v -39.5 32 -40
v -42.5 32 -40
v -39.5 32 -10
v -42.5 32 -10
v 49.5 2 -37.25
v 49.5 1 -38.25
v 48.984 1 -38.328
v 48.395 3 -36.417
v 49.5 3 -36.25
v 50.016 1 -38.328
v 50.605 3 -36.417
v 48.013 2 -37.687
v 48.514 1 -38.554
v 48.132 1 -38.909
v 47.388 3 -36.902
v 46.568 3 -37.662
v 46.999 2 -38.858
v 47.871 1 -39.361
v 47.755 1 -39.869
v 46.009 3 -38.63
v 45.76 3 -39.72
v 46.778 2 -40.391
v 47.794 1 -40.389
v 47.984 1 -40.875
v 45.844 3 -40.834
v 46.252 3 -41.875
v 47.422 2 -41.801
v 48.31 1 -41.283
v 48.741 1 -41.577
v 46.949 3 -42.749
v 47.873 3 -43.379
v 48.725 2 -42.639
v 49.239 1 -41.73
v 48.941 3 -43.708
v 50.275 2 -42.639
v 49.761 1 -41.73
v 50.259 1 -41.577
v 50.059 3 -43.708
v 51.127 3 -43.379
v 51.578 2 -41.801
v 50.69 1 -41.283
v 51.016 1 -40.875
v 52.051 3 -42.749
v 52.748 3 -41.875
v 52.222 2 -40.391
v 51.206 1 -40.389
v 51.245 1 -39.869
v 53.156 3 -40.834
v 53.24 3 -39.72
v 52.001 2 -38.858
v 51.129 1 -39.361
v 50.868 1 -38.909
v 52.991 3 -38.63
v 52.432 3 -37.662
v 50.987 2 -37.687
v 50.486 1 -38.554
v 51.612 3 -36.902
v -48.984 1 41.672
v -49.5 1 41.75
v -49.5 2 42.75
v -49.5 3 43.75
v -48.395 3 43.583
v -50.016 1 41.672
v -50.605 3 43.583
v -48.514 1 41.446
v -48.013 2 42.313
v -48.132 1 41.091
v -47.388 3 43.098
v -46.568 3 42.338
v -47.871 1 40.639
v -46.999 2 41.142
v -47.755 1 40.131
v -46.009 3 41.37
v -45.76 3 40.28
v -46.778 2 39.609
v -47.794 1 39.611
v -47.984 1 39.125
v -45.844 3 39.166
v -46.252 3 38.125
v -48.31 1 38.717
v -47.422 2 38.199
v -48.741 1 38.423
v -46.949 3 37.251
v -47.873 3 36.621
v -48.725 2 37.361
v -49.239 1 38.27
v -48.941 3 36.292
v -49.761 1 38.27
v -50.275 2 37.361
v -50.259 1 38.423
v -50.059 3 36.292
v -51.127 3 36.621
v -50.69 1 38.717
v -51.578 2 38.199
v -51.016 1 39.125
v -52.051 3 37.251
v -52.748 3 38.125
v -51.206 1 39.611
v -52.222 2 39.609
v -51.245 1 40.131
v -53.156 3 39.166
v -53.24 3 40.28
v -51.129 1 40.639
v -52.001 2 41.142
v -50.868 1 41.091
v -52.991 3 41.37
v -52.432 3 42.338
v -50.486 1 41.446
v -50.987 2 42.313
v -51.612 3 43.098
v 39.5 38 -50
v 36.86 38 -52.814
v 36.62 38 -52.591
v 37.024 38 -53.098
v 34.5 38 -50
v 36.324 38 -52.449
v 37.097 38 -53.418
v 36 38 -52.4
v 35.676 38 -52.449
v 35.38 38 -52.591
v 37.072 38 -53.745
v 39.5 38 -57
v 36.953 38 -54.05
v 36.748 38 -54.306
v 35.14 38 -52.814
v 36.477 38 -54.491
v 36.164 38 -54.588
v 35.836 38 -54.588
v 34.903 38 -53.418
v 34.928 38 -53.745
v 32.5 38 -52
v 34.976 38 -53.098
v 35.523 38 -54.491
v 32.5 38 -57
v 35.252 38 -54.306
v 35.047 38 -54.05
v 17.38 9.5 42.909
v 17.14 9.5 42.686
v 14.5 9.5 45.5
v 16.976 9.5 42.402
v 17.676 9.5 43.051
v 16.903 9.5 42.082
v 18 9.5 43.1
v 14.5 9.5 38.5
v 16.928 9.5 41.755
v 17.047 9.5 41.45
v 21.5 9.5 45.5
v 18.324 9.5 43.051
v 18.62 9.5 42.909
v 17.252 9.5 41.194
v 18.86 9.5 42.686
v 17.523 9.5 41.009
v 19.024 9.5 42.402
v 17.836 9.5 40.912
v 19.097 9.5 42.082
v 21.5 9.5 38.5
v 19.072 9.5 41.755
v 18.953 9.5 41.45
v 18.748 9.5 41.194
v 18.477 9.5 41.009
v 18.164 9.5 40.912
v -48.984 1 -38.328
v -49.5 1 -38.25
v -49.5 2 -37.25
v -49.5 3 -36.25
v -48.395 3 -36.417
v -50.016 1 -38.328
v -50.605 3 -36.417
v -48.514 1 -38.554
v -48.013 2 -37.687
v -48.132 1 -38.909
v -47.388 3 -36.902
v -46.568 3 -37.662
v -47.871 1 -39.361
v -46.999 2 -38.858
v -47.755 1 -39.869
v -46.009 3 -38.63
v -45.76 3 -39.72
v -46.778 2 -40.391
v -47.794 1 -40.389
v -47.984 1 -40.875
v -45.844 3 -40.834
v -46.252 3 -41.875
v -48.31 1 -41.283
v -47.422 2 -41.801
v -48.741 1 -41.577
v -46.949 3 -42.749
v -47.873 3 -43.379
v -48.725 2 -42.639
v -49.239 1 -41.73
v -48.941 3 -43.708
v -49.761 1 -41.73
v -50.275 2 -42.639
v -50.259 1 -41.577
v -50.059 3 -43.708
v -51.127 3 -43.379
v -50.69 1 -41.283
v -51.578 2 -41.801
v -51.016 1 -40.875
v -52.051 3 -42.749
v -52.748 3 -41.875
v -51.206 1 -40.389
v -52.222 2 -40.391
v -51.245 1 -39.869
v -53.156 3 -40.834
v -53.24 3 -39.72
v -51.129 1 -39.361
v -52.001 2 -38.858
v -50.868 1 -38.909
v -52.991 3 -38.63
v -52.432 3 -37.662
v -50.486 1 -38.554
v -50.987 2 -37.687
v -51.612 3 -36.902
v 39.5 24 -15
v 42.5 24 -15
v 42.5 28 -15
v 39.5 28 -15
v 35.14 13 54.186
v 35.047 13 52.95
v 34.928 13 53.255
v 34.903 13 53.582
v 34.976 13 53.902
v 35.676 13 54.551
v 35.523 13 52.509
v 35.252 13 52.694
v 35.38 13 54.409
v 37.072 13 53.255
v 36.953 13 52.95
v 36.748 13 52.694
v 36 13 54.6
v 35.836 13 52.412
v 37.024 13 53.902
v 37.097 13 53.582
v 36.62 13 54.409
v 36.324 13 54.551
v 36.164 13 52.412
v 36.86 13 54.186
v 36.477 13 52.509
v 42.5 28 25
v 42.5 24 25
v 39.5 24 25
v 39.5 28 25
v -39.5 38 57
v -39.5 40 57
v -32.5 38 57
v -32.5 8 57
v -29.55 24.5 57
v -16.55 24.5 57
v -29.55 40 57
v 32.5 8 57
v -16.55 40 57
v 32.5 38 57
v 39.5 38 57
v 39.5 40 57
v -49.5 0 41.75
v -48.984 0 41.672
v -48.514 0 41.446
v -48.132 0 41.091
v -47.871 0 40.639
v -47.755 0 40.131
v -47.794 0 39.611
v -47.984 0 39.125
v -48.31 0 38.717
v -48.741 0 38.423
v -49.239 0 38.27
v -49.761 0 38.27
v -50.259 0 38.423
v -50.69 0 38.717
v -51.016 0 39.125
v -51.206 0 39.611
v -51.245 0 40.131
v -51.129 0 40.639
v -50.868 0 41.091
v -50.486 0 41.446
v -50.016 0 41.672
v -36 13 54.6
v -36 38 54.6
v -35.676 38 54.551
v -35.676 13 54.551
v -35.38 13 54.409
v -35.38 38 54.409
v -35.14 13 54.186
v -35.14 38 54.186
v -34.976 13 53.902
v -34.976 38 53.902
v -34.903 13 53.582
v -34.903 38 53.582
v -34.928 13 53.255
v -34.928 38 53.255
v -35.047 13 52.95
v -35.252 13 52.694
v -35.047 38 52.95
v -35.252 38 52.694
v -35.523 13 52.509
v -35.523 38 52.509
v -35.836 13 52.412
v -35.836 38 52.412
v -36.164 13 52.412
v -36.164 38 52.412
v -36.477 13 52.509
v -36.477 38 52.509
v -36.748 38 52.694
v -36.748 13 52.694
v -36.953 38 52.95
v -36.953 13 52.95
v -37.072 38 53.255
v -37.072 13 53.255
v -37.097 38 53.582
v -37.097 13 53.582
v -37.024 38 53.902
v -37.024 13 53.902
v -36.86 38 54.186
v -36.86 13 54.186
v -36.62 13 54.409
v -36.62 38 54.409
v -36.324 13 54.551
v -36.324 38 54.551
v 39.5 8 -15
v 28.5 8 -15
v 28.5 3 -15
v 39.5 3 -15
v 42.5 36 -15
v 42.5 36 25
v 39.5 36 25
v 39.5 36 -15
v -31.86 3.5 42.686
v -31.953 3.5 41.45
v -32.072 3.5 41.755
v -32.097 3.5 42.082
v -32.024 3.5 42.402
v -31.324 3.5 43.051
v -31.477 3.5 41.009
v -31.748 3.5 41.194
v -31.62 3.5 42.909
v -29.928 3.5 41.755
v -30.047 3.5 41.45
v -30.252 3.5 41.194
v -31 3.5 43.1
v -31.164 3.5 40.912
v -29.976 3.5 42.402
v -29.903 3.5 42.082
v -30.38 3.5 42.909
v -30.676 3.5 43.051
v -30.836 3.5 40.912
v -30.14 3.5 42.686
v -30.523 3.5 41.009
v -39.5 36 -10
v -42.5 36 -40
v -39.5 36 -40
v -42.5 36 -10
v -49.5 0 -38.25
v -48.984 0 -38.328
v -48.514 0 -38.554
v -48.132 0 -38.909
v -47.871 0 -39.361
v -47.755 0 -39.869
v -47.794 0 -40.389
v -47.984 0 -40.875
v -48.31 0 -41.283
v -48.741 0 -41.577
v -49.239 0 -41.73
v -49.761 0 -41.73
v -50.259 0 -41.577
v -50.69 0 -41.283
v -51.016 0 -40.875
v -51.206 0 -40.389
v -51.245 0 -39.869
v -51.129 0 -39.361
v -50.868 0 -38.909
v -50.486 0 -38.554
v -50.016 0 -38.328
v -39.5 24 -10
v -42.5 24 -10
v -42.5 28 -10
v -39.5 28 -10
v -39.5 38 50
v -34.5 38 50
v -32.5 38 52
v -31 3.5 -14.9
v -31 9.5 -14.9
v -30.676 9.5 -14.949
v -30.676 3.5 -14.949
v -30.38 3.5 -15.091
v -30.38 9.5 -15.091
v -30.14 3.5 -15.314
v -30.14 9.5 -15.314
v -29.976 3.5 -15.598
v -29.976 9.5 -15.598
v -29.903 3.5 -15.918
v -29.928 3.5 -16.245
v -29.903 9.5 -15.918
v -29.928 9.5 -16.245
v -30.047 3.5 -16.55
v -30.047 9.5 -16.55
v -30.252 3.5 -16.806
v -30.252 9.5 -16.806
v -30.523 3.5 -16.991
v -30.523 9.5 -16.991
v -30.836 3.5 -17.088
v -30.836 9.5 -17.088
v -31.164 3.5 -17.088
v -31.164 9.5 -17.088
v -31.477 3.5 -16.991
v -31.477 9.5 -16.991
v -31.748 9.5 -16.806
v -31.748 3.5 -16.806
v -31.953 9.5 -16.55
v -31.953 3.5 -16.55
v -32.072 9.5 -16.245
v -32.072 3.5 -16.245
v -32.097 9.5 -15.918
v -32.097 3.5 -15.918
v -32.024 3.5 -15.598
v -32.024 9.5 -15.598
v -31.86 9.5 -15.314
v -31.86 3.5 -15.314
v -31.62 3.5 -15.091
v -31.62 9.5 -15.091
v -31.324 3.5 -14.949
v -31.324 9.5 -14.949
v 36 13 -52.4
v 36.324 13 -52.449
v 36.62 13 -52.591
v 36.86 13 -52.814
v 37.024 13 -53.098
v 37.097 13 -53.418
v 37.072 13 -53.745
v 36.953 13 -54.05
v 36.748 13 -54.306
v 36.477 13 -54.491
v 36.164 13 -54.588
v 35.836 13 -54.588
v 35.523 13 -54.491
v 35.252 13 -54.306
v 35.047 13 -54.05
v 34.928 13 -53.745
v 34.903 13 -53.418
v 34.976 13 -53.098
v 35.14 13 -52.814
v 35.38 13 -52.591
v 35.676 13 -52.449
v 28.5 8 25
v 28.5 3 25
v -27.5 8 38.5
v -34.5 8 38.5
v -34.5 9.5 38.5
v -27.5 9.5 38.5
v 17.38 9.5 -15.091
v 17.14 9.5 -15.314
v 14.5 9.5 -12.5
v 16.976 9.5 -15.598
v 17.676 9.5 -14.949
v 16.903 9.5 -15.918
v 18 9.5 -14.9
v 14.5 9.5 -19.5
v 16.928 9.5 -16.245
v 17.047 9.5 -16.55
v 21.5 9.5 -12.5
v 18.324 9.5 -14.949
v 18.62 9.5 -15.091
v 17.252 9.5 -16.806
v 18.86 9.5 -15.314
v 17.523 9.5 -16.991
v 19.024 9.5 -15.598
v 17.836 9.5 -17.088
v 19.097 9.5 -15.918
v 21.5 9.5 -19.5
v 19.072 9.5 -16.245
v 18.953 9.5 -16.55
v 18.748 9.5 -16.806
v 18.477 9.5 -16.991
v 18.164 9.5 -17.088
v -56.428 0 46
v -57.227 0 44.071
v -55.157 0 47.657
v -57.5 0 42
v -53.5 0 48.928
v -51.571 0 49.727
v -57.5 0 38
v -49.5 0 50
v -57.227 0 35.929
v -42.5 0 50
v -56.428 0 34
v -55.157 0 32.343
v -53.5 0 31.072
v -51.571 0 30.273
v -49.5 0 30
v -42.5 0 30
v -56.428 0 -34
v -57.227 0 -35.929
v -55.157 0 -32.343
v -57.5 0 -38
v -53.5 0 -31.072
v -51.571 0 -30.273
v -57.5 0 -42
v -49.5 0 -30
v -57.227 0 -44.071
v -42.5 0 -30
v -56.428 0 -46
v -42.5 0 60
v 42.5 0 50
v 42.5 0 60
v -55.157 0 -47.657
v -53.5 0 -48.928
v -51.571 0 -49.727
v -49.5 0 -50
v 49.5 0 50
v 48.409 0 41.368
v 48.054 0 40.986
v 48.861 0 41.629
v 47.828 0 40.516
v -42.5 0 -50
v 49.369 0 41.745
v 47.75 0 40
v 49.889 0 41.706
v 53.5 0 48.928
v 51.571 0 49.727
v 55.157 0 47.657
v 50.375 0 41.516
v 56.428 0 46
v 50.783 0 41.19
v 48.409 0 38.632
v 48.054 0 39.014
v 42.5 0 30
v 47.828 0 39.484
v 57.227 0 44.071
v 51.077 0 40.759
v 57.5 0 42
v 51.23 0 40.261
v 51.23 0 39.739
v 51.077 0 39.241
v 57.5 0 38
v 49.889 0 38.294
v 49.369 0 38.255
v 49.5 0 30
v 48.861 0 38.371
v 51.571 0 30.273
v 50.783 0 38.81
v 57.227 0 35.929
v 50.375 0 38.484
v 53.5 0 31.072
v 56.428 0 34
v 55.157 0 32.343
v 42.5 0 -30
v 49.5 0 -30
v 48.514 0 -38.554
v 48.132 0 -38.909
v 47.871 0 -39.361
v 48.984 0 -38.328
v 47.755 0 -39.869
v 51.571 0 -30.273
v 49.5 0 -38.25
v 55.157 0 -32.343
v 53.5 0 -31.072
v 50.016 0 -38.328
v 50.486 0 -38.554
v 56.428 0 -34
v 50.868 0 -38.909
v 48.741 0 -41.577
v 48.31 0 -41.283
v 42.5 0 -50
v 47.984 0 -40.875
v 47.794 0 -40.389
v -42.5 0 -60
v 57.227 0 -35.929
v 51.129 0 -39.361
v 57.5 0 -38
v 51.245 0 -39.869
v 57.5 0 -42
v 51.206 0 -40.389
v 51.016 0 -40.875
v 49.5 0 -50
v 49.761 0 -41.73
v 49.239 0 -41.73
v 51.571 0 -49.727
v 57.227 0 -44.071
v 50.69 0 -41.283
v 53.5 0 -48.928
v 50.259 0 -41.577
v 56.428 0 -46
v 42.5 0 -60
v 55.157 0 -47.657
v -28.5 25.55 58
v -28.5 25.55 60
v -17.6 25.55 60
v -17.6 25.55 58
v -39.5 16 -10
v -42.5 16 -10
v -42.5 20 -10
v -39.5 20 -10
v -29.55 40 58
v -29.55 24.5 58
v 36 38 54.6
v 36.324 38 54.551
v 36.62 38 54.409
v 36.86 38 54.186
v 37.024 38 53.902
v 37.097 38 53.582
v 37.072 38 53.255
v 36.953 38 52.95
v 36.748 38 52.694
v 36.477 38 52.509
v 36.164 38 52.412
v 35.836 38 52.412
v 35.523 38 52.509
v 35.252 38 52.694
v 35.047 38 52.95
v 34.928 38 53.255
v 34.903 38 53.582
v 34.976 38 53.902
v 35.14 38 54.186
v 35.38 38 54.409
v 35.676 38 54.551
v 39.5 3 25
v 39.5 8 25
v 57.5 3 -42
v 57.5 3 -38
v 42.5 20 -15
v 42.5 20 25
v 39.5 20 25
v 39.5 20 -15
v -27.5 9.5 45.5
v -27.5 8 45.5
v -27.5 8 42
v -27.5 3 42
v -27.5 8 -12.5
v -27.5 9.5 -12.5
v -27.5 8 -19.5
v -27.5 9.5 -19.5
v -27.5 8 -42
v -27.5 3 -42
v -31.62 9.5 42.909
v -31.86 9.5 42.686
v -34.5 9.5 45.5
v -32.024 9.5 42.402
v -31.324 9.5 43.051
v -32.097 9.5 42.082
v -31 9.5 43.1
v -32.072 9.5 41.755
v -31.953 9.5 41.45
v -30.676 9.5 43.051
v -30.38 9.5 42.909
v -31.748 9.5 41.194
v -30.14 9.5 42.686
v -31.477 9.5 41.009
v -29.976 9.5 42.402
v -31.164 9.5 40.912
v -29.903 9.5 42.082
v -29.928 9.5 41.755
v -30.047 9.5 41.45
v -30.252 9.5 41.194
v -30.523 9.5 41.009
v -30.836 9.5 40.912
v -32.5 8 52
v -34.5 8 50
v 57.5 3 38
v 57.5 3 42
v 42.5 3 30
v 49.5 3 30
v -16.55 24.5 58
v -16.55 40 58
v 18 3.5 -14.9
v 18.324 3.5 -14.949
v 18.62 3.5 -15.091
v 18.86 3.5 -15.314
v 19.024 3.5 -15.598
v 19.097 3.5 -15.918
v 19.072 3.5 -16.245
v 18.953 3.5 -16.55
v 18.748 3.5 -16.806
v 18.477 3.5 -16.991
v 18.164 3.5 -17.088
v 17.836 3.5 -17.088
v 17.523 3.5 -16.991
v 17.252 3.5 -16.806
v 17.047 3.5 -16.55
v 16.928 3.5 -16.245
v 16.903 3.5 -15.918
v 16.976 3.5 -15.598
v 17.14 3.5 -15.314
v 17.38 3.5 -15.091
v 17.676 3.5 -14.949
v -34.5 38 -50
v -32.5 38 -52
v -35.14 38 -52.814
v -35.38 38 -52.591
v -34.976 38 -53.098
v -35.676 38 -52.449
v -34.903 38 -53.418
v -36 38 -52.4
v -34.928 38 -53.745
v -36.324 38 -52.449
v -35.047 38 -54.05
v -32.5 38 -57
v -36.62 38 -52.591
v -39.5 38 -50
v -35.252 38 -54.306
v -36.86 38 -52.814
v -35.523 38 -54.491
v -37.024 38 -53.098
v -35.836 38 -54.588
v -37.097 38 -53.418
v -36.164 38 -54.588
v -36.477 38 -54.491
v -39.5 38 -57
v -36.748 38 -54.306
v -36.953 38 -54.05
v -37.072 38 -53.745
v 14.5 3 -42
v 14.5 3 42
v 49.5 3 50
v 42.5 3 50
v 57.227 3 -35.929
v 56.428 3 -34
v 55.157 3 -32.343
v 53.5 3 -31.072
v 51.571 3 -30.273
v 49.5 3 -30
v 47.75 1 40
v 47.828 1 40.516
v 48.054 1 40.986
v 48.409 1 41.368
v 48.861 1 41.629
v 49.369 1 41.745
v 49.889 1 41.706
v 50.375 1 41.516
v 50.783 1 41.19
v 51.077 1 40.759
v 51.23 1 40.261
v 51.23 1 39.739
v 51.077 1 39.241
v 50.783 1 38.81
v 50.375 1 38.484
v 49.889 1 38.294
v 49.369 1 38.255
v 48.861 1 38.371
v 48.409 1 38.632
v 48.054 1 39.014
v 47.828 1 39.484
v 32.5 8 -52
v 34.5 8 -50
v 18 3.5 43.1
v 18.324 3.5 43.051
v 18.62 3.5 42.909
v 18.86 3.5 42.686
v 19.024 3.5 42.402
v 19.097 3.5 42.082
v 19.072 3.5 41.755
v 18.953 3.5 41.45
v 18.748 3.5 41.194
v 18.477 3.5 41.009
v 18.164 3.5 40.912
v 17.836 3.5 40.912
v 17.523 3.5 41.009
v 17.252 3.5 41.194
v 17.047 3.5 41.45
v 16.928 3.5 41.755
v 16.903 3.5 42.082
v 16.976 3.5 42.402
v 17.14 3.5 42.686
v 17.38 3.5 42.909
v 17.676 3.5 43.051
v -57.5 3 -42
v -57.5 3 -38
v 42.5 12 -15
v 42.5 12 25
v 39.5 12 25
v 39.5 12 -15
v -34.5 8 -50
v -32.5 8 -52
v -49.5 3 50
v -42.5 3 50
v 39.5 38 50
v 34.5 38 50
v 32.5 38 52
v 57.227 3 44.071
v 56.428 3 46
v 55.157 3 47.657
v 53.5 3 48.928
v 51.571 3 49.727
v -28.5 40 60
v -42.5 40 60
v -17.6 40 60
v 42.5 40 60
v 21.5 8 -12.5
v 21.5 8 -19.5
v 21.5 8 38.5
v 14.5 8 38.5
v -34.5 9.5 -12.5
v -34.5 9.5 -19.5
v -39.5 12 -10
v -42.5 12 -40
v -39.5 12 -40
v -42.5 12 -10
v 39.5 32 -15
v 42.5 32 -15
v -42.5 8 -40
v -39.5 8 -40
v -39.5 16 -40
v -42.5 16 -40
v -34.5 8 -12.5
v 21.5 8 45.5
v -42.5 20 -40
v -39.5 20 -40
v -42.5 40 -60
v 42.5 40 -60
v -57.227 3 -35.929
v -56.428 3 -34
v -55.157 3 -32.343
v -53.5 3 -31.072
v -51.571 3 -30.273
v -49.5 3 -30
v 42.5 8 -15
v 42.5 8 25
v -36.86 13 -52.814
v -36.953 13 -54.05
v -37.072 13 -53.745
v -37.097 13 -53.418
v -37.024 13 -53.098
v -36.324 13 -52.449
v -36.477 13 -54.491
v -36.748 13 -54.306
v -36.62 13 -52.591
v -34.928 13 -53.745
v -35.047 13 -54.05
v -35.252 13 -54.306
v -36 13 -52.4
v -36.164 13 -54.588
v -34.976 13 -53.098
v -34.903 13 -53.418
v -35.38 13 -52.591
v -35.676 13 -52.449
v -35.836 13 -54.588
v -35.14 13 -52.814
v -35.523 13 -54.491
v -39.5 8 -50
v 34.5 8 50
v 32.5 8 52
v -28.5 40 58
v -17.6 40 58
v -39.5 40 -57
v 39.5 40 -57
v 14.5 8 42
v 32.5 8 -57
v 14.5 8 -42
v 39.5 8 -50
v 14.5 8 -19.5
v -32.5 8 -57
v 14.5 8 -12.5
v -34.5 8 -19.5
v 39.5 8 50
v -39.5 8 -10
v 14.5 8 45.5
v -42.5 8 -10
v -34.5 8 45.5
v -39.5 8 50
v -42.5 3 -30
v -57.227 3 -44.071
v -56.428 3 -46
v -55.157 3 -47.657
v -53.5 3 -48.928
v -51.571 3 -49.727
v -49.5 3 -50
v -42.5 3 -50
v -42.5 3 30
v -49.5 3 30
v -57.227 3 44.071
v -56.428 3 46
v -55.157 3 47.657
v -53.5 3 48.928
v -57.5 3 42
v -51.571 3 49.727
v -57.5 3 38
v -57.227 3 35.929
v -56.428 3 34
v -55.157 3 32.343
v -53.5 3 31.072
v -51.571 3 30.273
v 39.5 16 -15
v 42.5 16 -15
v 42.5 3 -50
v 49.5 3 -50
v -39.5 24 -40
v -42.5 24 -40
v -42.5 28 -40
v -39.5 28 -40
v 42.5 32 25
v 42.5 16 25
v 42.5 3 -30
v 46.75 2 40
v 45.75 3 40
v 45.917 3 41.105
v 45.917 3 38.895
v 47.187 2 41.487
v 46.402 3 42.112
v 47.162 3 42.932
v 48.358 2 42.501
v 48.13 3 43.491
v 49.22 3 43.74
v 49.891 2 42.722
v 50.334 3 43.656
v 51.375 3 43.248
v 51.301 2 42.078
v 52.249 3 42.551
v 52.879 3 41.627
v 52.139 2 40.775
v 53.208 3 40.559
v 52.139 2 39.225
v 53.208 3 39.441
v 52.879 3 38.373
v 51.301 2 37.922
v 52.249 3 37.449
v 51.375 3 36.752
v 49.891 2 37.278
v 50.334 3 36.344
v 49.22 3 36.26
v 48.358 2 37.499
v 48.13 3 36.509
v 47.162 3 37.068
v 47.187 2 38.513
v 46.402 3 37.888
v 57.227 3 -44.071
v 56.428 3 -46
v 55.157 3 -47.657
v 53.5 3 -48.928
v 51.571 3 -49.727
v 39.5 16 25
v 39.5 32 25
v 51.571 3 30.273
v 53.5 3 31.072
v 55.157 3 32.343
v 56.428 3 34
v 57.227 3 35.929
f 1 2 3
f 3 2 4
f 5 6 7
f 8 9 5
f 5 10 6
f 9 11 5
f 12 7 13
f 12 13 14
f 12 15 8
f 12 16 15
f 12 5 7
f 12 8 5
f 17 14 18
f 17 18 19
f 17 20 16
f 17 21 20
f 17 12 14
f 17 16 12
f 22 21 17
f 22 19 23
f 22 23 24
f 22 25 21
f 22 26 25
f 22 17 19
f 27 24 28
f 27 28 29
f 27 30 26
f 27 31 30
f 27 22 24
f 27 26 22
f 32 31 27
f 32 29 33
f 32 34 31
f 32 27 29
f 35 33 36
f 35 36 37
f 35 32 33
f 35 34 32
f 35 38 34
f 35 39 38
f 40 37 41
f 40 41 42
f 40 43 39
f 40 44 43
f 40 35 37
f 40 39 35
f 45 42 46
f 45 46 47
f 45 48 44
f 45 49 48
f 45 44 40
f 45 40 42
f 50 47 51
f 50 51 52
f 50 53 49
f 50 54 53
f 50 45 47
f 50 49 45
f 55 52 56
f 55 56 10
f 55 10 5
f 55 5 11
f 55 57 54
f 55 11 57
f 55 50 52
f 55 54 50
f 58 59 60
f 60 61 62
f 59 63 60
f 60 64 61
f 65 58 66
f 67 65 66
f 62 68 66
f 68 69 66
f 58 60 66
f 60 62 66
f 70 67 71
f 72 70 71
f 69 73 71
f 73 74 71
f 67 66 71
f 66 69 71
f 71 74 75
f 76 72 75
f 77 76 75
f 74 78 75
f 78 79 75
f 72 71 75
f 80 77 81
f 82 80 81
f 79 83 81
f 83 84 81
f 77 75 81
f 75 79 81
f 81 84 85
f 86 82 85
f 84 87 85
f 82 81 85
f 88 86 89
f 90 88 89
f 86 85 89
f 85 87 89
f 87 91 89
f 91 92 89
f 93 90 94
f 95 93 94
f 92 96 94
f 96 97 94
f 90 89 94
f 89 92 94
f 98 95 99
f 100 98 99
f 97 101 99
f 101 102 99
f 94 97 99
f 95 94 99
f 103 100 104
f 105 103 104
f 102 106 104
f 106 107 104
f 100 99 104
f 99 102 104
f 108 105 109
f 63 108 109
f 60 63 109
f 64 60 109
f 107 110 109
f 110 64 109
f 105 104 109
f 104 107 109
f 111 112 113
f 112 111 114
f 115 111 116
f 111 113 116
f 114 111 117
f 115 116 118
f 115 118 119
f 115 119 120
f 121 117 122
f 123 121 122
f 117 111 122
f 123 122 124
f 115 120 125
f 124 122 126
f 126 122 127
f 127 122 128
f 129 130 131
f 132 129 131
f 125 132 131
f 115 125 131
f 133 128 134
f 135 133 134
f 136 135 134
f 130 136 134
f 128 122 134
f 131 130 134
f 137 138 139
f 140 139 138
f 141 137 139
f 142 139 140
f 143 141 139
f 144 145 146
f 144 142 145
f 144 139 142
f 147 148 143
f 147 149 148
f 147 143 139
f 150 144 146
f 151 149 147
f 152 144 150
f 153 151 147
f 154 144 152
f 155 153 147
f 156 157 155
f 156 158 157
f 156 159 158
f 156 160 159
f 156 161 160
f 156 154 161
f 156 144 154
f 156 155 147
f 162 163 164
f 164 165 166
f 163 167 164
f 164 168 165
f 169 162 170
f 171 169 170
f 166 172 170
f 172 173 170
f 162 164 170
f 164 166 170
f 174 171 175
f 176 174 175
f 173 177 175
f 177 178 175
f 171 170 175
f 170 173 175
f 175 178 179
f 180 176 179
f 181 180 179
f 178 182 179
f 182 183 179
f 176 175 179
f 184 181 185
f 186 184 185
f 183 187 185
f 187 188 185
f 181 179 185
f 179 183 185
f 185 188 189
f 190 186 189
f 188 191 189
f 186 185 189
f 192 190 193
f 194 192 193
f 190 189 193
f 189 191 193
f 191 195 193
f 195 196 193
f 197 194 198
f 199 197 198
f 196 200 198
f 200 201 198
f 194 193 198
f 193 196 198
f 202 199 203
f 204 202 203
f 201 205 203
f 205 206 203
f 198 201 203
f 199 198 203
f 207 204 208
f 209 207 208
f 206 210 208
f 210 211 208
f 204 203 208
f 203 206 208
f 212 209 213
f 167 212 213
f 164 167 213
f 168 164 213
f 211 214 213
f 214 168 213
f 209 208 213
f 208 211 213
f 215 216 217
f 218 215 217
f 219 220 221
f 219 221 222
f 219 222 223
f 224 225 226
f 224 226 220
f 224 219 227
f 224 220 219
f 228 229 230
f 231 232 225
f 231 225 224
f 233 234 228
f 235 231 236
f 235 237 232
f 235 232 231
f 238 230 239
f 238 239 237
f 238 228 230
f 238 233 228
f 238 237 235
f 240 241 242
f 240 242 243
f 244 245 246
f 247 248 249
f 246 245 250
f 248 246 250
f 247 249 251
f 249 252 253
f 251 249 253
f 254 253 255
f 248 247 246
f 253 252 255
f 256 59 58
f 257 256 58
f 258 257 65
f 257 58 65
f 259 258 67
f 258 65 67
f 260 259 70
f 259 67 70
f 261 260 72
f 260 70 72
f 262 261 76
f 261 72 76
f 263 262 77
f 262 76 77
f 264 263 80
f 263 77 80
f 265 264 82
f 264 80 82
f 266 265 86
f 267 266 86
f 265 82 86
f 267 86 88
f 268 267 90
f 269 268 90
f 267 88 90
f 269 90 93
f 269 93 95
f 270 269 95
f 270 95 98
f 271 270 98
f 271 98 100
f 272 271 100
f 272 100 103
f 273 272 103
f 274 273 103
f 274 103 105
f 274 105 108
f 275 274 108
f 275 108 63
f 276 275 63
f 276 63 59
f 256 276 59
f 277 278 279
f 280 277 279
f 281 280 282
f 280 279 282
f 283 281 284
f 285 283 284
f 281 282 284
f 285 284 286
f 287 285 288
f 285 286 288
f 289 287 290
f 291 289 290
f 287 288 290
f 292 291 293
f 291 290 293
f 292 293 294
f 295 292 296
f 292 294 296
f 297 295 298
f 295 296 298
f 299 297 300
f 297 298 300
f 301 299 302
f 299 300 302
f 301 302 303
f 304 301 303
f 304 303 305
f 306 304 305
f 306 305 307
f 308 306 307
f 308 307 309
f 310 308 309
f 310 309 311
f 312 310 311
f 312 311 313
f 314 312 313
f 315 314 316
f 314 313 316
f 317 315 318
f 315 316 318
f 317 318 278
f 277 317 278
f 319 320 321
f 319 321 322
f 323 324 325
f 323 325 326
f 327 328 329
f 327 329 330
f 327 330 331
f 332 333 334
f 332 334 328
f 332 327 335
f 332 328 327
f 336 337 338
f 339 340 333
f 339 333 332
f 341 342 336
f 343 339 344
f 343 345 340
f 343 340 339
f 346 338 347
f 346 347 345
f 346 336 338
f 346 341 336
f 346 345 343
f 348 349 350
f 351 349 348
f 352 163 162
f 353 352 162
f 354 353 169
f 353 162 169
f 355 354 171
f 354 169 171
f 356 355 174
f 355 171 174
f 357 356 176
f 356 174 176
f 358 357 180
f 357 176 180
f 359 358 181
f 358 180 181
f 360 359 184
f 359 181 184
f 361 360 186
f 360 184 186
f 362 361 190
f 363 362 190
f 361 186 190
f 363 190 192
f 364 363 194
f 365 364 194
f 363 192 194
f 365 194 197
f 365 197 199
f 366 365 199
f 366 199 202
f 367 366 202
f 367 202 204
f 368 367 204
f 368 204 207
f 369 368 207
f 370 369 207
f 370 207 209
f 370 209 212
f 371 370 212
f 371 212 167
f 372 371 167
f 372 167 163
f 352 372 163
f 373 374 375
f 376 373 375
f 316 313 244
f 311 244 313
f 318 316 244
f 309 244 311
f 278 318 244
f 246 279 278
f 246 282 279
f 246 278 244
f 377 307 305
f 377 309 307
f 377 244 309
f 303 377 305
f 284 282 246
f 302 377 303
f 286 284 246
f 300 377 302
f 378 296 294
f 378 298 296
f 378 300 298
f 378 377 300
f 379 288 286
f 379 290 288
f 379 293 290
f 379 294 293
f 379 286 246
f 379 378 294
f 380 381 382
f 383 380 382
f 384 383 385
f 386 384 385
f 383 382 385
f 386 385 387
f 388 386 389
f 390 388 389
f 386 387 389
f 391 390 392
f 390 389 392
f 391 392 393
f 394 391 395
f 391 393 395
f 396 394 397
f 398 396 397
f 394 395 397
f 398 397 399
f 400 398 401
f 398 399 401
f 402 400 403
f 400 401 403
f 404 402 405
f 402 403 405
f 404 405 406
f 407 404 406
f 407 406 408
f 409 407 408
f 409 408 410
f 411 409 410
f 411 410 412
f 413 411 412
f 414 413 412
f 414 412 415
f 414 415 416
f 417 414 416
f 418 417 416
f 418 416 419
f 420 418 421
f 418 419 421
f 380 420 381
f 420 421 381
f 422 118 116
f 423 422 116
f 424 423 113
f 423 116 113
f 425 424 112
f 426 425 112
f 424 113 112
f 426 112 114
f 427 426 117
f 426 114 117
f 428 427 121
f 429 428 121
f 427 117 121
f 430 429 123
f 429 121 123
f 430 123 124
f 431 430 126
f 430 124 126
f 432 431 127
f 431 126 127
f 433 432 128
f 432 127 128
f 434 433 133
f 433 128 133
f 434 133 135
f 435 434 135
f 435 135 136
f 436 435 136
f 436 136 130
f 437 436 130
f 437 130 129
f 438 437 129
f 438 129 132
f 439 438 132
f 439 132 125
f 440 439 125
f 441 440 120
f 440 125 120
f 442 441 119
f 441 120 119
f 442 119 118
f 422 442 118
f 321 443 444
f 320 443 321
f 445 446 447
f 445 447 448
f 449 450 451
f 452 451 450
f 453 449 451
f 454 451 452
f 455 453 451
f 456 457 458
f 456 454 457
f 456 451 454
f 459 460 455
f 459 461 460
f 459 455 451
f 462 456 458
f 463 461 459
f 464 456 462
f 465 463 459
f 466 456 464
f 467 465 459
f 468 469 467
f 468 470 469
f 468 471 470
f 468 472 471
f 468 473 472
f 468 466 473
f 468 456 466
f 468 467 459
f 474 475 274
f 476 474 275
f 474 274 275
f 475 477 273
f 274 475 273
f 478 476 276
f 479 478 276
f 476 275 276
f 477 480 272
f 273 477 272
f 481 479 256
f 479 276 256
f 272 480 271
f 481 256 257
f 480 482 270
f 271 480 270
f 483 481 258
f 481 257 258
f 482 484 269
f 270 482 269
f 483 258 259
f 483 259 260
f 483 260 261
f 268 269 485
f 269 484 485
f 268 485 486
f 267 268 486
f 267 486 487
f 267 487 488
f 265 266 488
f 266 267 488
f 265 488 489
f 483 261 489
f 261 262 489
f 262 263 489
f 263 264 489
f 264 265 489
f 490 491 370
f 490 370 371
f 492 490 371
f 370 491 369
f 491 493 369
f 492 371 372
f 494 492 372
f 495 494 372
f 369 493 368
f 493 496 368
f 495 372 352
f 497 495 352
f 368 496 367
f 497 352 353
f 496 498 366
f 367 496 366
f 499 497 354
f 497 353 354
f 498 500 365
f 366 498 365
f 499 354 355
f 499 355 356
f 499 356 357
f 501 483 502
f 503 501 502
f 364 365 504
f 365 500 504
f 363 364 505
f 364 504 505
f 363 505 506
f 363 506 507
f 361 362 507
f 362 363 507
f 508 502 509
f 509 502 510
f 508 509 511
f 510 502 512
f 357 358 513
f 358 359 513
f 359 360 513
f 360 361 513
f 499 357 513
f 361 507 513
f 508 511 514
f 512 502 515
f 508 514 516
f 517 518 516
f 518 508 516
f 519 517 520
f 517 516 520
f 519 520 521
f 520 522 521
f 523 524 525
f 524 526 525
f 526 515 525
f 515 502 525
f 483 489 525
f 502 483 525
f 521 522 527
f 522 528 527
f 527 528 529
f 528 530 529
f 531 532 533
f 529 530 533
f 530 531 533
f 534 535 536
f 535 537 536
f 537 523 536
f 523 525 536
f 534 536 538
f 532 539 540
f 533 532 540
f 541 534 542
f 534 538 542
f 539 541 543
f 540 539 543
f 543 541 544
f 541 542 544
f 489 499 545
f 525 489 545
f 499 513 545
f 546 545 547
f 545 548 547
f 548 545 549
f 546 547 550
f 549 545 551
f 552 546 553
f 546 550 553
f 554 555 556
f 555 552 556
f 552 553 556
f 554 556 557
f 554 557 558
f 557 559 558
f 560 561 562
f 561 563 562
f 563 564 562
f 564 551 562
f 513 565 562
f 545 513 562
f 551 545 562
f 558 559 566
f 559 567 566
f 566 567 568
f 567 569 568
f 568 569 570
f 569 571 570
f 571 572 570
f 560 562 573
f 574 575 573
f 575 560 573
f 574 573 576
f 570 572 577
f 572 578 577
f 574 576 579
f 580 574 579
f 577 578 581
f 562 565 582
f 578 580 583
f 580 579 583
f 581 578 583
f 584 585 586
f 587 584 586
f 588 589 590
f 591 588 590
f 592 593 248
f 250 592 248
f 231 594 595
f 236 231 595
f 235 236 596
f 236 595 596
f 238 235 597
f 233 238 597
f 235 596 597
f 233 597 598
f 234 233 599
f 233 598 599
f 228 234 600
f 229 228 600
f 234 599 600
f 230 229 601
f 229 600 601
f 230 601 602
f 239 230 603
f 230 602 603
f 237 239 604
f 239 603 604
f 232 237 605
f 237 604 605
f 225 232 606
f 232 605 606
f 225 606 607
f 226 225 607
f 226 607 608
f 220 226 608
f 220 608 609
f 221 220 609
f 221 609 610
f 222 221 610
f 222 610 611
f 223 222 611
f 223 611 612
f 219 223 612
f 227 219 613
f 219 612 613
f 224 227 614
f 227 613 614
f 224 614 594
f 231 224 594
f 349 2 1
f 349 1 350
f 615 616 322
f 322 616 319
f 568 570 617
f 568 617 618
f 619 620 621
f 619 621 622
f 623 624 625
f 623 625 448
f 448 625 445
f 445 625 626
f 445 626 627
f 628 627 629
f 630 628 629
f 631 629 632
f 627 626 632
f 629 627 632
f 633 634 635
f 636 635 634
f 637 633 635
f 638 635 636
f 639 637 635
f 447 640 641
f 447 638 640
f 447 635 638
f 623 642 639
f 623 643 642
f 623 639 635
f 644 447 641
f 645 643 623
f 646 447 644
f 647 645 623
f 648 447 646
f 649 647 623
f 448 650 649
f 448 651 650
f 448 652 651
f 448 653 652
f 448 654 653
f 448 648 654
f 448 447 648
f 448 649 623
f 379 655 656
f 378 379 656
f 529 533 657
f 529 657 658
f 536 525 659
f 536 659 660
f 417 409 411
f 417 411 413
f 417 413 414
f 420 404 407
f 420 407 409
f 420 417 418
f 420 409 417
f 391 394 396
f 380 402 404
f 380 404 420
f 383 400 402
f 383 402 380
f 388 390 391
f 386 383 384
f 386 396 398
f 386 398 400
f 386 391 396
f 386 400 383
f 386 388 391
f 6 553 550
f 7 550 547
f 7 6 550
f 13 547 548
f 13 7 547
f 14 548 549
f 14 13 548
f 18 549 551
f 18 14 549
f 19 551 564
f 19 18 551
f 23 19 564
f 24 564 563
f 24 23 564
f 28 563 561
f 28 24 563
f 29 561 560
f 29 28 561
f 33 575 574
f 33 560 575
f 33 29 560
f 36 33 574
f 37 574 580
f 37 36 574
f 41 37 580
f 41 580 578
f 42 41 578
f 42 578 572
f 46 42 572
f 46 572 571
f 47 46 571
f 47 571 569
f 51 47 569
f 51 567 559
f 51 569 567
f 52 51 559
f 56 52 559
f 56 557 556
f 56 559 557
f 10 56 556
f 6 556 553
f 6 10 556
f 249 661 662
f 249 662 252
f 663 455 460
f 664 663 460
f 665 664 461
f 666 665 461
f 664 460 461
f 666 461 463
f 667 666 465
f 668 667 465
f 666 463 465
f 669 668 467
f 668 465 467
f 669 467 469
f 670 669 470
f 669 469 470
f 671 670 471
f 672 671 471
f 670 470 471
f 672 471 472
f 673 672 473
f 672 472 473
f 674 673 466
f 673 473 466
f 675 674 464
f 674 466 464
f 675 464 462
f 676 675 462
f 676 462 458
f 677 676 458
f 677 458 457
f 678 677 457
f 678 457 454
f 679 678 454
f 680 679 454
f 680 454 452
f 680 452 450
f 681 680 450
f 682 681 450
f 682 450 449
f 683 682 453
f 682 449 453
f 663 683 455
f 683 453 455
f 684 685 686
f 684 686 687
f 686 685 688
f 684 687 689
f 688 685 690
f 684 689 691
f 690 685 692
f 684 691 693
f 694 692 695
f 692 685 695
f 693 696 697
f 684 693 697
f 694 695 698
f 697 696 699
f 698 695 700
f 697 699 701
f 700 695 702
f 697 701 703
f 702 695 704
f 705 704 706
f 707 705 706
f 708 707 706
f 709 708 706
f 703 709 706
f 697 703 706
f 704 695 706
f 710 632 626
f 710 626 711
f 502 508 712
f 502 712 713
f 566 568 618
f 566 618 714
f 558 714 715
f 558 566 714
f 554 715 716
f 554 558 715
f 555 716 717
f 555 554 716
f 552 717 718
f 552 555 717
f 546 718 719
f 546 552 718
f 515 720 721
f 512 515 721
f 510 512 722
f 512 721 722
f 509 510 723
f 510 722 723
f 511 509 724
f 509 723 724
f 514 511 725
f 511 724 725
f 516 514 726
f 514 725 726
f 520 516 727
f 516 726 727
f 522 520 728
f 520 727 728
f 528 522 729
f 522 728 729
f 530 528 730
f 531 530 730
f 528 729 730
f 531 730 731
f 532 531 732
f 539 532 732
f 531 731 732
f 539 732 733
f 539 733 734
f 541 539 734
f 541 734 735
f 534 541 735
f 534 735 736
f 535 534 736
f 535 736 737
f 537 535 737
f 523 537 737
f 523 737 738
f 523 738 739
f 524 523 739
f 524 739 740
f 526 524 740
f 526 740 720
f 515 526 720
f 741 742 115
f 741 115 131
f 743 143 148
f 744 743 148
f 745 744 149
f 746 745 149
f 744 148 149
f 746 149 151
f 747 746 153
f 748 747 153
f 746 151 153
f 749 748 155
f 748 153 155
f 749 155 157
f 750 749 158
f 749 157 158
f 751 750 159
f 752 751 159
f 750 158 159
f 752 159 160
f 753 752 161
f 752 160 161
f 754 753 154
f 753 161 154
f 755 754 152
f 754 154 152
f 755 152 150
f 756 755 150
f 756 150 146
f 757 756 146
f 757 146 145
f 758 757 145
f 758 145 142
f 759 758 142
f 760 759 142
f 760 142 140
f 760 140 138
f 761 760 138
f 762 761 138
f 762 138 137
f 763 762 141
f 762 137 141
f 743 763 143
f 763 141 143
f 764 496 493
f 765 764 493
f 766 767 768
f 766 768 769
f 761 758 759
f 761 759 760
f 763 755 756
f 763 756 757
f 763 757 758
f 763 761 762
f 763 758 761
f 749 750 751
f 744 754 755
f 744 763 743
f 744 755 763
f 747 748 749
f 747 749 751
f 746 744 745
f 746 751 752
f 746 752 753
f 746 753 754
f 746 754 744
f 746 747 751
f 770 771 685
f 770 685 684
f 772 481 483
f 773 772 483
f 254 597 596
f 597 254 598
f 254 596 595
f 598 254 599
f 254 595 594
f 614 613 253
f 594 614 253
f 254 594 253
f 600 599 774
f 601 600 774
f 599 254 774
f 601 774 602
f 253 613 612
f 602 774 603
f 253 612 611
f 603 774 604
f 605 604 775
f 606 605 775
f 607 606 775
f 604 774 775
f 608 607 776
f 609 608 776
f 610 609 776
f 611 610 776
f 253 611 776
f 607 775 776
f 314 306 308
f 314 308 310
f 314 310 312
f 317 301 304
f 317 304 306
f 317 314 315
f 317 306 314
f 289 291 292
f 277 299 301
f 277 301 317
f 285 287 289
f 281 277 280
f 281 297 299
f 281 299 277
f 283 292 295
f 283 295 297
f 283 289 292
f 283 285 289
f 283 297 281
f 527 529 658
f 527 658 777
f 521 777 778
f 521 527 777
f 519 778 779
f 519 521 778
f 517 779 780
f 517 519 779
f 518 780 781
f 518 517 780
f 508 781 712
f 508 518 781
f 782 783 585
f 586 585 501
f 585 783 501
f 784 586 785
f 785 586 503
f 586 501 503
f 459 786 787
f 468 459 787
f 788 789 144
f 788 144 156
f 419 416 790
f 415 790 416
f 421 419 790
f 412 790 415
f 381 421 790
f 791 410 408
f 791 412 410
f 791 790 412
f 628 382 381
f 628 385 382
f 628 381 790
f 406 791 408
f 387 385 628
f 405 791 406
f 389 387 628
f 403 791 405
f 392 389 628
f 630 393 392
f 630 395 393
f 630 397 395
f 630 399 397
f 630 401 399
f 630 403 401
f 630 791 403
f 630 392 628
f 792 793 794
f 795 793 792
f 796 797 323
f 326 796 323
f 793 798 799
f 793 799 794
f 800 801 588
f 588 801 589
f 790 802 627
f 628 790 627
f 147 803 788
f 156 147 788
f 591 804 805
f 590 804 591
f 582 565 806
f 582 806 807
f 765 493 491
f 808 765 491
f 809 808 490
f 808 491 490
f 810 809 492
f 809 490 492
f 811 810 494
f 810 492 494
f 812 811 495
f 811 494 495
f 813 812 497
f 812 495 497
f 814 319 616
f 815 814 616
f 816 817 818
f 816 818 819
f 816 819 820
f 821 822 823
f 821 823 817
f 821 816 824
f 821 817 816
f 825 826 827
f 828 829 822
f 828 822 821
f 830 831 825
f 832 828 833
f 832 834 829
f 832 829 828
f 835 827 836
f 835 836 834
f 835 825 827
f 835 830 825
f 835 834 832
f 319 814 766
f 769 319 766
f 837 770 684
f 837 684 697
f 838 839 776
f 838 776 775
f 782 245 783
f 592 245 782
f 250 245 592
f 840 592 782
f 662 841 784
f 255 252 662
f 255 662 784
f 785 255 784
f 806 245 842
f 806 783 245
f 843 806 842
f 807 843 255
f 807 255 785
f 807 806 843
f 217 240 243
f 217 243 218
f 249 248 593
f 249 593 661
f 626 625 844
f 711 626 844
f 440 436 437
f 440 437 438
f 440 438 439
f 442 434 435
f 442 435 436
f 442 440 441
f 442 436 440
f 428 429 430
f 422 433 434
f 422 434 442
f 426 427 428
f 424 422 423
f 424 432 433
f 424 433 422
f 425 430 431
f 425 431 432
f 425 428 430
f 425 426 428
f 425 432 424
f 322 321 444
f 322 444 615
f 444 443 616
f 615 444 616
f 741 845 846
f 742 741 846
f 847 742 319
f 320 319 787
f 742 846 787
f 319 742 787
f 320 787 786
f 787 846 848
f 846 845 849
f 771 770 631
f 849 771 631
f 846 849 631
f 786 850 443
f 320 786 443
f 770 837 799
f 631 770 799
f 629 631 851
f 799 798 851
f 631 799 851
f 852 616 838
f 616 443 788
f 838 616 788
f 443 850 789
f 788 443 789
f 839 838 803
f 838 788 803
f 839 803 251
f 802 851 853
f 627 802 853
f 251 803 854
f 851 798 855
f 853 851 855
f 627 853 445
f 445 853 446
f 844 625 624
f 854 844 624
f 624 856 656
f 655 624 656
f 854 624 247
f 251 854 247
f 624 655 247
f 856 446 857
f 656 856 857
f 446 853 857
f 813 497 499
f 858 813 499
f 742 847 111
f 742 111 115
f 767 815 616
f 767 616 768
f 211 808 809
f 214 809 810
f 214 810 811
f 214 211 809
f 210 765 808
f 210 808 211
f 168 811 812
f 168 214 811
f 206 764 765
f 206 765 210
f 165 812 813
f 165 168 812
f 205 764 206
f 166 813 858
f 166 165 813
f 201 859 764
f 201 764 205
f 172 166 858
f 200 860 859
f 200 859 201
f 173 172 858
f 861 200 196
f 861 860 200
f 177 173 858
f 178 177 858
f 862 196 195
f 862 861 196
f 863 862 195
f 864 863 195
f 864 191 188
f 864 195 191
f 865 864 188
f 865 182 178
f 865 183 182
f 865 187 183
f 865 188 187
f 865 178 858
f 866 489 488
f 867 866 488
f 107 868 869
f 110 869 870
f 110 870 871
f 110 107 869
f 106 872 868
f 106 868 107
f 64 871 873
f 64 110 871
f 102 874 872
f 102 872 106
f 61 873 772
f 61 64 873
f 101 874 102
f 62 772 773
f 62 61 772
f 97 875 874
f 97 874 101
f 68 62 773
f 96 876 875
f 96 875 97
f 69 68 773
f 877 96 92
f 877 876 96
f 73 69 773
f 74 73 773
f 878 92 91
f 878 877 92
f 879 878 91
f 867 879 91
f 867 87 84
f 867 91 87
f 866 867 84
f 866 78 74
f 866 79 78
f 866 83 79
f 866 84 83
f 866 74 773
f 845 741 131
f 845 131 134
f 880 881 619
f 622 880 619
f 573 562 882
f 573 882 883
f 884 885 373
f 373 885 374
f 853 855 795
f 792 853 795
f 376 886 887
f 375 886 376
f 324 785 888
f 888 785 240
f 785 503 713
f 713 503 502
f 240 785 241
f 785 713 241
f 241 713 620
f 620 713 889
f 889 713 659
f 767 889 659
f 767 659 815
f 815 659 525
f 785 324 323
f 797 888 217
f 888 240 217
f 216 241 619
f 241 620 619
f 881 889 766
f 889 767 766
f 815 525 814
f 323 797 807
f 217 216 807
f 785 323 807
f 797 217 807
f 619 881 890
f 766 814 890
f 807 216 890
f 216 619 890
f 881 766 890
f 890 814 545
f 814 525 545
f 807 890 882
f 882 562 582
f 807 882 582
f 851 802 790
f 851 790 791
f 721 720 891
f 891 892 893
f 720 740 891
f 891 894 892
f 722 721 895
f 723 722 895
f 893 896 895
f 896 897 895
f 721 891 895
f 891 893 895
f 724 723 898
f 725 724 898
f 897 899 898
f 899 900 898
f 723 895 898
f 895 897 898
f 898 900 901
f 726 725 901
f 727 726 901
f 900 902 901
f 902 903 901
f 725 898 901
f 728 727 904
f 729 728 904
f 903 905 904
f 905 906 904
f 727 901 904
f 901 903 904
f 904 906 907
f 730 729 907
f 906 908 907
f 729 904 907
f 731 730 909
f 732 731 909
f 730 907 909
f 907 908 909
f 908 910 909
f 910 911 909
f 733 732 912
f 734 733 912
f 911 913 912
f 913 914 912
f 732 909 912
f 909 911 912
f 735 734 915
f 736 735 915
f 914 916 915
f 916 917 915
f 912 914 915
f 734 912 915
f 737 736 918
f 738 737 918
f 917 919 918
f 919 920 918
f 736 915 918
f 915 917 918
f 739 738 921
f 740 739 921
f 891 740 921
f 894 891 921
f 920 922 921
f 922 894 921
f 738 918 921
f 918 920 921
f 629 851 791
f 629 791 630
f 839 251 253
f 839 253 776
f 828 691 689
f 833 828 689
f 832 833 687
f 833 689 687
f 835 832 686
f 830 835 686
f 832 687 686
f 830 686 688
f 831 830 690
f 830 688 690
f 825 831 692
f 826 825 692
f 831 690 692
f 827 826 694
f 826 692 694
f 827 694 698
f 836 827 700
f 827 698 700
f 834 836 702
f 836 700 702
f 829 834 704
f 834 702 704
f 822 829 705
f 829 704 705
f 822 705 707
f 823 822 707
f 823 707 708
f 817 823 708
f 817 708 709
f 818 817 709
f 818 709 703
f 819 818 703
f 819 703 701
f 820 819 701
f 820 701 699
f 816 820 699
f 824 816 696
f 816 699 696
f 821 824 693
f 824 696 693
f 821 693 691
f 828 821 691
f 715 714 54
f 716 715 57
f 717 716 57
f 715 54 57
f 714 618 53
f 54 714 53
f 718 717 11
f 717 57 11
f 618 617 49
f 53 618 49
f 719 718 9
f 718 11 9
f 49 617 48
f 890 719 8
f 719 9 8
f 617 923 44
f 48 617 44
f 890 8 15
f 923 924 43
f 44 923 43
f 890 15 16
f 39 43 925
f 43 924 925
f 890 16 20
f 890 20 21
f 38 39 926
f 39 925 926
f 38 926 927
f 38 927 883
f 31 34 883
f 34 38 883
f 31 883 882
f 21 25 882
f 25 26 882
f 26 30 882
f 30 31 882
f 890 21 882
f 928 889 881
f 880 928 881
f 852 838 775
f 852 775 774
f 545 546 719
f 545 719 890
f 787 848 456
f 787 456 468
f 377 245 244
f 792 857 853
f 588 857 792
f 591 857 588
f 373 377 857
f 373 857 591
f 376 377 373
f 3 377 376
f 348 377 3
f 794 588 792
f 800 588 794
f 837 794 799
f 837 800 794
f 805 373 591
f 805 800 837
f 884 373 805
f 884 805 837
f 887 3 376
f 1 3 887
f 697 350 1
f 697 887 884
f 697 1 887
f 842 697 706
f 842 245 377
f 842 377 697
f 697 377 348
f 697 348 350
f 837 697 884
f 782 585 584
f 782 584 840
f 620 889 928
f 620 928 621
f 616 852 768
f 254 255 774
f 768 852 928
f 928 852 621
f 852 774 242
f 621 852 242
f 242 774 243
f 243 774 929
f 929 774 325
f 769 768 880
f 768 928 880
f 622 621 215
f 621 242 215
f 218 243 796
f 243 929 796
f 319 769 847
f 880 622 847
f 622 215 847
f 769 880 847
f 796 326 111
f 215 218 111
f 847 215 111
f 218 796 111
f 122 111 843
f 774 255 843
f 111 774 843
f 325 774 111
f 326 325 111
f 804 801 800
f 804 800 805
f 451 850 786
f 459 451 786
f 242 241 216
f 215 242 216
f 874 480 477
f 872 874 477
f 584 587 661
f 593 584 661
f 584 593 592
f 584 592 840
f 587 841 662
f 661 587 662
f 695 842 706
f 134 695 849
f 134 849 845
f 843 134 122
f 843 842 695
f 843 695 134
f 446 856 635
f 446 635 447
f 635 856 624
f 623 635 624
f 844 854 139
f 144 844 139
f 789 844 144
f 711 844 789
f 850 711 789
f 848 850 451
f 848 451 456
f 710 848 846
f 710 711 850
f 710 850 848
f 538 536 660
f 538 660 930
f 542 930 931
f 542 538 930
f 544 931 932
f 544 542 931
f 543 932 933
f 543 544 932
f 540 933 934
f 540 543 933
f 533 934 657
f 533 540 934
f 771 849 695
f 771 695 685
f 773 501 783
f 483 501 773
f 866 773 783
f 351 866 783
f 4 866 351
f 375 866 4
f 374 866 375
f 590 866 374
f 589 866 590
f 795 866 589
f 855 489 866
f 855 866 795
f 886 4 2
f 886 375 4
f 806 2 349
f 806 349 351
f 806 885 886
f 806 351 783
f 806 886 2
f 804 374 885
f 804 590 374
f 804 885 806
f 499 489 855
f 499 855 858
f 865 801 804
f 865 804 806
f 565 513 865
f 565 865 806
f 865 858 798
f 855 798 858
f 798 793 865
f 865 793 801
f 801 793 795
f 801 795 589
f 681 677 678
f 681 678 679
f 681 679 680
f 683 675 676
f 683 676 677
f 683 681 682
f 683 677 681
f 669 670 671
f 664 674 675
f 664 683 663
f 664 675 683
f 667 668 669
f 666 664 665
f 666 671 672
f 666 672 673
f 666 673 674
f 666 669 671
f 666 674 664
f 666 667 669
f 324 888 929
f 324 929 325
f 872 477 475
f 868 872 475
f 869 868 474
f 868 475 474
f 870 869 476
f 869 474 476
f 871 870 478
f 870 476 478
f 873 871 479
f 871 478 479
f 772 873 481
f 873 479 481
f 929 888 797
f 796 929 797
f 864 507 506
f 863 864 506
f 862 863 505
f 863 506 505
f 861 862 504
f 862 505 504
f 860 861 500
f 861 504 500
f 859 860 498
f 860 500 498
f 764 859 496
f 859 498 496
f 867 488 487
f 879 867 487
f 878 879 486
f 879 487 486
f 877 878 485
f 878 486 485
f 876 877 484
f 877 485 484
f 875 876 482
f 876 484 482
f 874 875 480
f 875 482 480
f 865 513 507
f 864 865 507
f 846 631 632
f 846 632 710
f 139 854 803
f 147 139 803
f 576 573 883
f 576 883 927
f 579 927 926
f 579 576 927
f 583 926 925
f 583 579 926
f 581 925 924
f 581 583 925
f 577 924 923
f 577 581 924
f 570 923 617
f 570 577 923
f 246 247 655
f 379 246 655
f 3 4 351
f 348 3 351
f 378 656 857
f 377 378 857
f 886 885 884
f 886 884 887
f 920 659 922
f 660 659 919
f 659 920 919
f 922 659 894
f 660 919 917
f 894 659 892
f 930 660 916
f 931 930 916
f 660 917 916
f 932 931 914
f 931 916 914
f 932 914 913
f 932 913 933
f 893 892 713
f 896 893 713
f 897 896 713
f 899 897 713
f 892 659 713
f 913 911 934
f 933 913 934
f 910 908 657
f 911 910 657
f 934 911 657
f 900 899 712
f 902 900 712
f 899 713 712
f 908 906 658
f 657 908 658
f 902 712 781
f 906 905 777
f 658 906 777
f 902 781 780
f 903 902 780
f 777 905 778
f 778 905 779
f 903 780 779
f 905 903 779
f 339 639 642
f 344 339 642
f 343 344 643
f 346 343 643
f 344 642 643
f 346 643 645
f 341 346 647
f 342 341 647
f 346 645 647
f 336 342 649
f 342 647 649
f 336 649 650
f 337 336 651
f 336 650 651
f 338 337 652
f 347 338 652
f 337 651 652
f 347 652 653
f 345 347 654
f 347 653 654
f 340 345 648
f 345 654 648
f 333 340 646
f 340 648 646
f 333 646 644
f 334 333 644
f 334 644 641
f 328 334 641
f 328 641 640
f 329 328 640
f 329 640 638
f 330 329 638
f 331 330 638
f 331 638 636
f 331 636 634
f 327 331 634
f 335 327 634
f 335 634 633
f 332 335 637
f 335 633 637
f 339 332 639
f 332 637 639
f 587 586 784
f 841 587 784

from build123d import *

# Parameters (mm, degrees)
SKETCH_1_W               = 85
SKETCH_1_H               = 120
EXTRUDE_1_DEPTH          = 40
SKETCH_2_W               = 79
SKETCH_2_H               = 114
CUT_EXTRUDE_1_DEPTH      = 32
SKETCH_3_W               = 42
SKETCH_3_H               = 84
CUT_EXTRUDE_2_DEPTH      = 5
SKETCH_4_W               = 7
SKETCH_4_H               = 7
EXTRUDE_2_DEPTH          = 1.5
SKETCH_5_R               = 1.1
CUT_EXTRUDE_3_DEPTH      = 6
EXTRUDE_3_DEPTH          = 30
SKETCH_7_R               = 1.1
CUT_EXTRUDE_4_DEPTH      = 25
EXTRUDE_4_DEPTH          = 3
SKETCH_9_R               = 1.75
CUT_EXTRUDE_5_DEPTH      = 91.968401107
PATTERN_LINEAR_1_COUNT   = 2
PATTERN_LINEAR_1_PITCH   = 80
MIRROR_1_COPY_1_DEPTH    = 3
MIRROR_1_COPY_2_SKETCH_R = 1.75
MIRROR_1_COPY_2_DEPTH    = 91.968401107
CHAMFER_2_SIZE           = 2
SKETCH_10_W              = 10.9
SKETCH_10_H              = 16.45
CUT_EXTRUDE_6_DEPTH      = 5
SKETCH_11_W              = 13
SKETCH_11_H              = 2
CUT_EXTRUDE_7_DEPTH      = 15.5
SKETCH_12_W              = 40
SKETCH_12_H              = 4
CUT_EXTRUDE_8_DEPTH      = 10
SKETCH_13_W              = 30
SKETCH_13_H              = 4
CUT_EXTRUDE_9_DEPTH      = 5
SKETCH_14_W              = 11
SKETCH_14_H              = 40
CUT_EXTRUDE_10_DEPTH     = 5


with BuildPart() as part:
    # Эскиз1 → Бобышка-Вытянуть1 (new body)
    with BuildSketch(Plane(origin=(0, 0, 0), x_dir=(1, 0, 0), z_dir=(0, 1, 0))):
        Rectangle(SKETCH_1_W, SKETCH_1_H)
    extrude(amount=EXTRUDE_1_DEPTH)

    # Эскиз2 → Вырез-Вытянуть1 (cut)
    with BuildSketch(Plane(origin=(0, 40, 0), x_dir=(1, 0, 0), z_dir=(0, 1, 0))):
        Rectangle(SKETCH_2_W, SKETCH_2_H)
    extrude(amount=-CUT_EXTRUDE_1_DEPTH, mode=Mode.SUBTRACT)

    # Эскиз3 → Вырез-Вытянуть2 (cut)
    with BuildSketch(Plane(origin=(0, 8, 0), x_dir=(1, 0, 0), z_dir=(0, 1, 0))):
        with Locations((-6.5, 0)):
            Rectangle(SKETCH_3_W, SKETCH_3_H)
    extrude(amount=-CUT_EXTRUDE_2_DEPTH, mode=Mode.SUBTRACT)

    # Эскиз4 → Бобышка-Вытянуть2 (add)
    with BuildSketch(Plane(origin=(0, 8, 0), x_dir=(1, 0, 0), z_dir=(0, 1, 0))):
        with Locations((-31, 16)):
            Rectangle(SKETCH_4_W, SKETCH_4_H)
        with Locations((18, 16)):
            Rectangle(SKETCH_4_W, SKETCH_4_H)
        with Locations((-31, -42)):
            Rectangle(SKETCH_4_W, SKETCH_4_H)
        with Locations((18, -42)):
            Rectangle(SKETCH_4_W, SKETCH_4_H)
    extrude(amount=EXTRUDE_2_DEPTH)

    # Эскиз5 → Вырез-Вытянуть3 (cut)
    with BuildSketch(Plane(origin=(0, 9.5, 0), x_dir=(1, 0, 0), z_dir=(0, 1, 0))):
        with Locations(Location((-31, 16, 0), (0, 0, 270))):
            Circle(SKETCH_5_R)
        with Locations(Location((18, 16, 0), (0, 0, 270))):
            Circle(SKETCH_5_R)
        with Locations(Location((18, -42, 0), (0, 0, 270))):
            Circle(SKETCH_5_R)
        with Locations(Location((-31, -42, 0), (0, 0, 270))):
            Circle(SKETCH_5_R)
    extrude(amount=-CUT_EXTRUDE_3_DEPTH, mode=Mode.SUBTRACT)

    # Эскиз6 → Бобышка-Вытянуть3 (add)
    with BuildSketch(Plane(origin=(0, 8, 0), x_dir=(1, 0, 0), z_dir=(0, 1, 0))):
        Polygon((-32.5, 52), (-34.5, 50), (-39.5, 50), (-39.5, 57), (-32.5, 57), align=None)
        Polygon((34.5, 50), (32.5, 52), (32.5, 57), (39.5, 57), (39.5, 50), align=None)
        Polygon((-39.5, -57), (-32.5, -57), (-32.5, -52), (-34.5, -50), (-39.5, -50), align=None)
        Polygon((39.5, -57), (32.5, -57), (32.5, -52), (34.5, -50), (39.5, -50), align=None)
    extrude(amount=EXTRUDE_3_DEPTH)

    # Эскиз7 → Вырез-Вытянуть4 (cut)
    with BuildSketch(Plane(origin=(0, 38, 0), x_dir=(1, 0, 0), z_dir=(0, 1, 0))):
        with Locations(Location((-36, 53.5, 0), (0, 0, 270))):
            Circle(SKETCH_7_R)
        with Locations(Location((36, 53.5, 0), (0, 0, 270))):
            Circle(SKETCH_7_R)
        with Locations(Location((-36, -53.5, 0), (0, 0, 270))):
            Circle(SKETCH_7_R)
        with Locations(Location((36, -53.5, 0), (0, 0, 270))):
            Circle(SKETCH_7_R)
    extrude(amount=-CUT_EXTRUDE_4_DEPTH, mode=Mode.SUBTRACT)

    # Эскиз8 → Бобышка-Вытянуть4 (add)
    with BuildSketch(Plane(origin=(0, 0, 0), x_dir=(1, 0, 0), z_dir=(0, 1, 0))):
        with BuildLine():
            Line((-40.5, 50), (-49.5, 50))
            ThreePointArc((-49.5, 50), (-55.156854249, 47.656854249), (-57.5, 42))
            Line((-57.5, 42), (-57.5, 38))
            ThreePointArc((-57.5, 38), (-55.156854249, 32.343145751), (-49.5, 30))
            Line((-49.5, 30), (-40.5, 30))
            Line((-40.5, 30), (-40.5, 50))
        make_face()
    extrude_4 = extrude(amount=EXTRUDE_4_DEPTH)

    # Эскиз9 → Вырез-Вытянуть5 (cut, through all)
    with BuildSketch(Plane(origin=(0, 3, 0), x_dir=(1, 0, 0), z_dir=(0, 1, 0))):
        with Locations(Location((-49.5, 40, 0), (0, 0, 270))):
            Circle(SKETCH_9_R)
    cut_extrude_5 = extrude(amount=-CUT_EXTRUDE_5_DEPTH, mode=Mode.SUBTRACT)

    # Линейный массив1: Бобышка-Вытянуть4, Вырез-Вытянуть5 ×2
    with Locations(*[(0, 0, i * PATTERN_LINEAR_1_PITCH) for i in range(1, PATTERN_LINEAR_1_COUNT)]):
        add(extrude_4)
        add(cut_extrude_5, mode=Mode.SUBTRACT)

    # Зеркальное отражение1: Бобышка-Вытянуть4, Вырез-Вытянуть5 across plane
    add(extrude_4.mirror(Plane(origin=(0, 0, 0), x_dir=(0, 0, 1), z_dir=(1, 0, 0))))
    add(cut_extrude_5.mirror(Plane(origin=(0, 0, 0), x_dir=(0, 0, 1), z_dir=(1, 0, 0))), mode=Mode.SUBTRACT)

    # Зеркальное отражение1 copy 1 sketch → Зеркальное отражение1 copy 1 (add)
    with BuildSketch(Plane(origin=(0, 0, 80), x_dir=(-1, 0, 0), z_dir=(0, 1, 0))):
        with BuildLine():
            Line((-40.5, -50), (-49.5, -50))
            ThreePointArc((-49.5, -50), (-55.156854249, -47.656854249), (-57.5, -42))
            Line((-57.5, -42), (-57.5, -38))
            ThreePointArc((-57.5, -38), (-55.156854249, -32.343145751), (-49.5, -30))
            Line((-49.5, -30), (-40.5, -30))
            Line((-40.5, -30), (-40.5, -50))
        make_face()
    extrude(amount=MIRROR_1_COPY_1_DEPTH)

    # Зеркальное отражение1 copy 2 sketch → Зеркальное отражение1 copy 2 (cut, through all)
    with BuildSketch(Plane(origin=(0, 3, 80), x_dir=(-1, 0, 0), z_dir=(0, 1, 0))):
        with Locations((-49.5, -40)):
            Circle(MIRROR_1_COPY_2_SKETCH_R)
    extrude(amount=-MIRROR_1_COPY_2_DEPTH, mode=Mode.SUBTRACT)

    # Фаска2
    chamfer_2_edges = [part.edges().sort_by_distance(p)[0] for p in [
        (-49.5, 3, -41.75),
        (-49.5, 3, 38.25),
        (49.5, 3, -41.75),
        (51.25, 3, 40),
    ]]
    chamfer(chamfer_2_edges, length=CHAMFER_2_SIZE)

    # Эскиз10 → Вырез-Вытянуть6 (cut)
    with BuildSketch(Plane.XY.offset(60)):
        with Locations((-23.05, 33.775)):
            Rectangle(SKETCH_10_W, SKETCH_10_H)
    extrude(amount=-CUT_EXTRUDE_6_DEPTH, mode=Mode.SUBTRACT)

    # Эскиз11 → Вырез-Вытянуть7 (cut)
    with BuildSketch(Plane(origin=(0, 40, 0), x_dir=(1, 0, 0), z_dir=(0, 1, 0))):
        with Locations((-23.05, -57)):
            Rectangle(SKETCH_11_W, SKETCH_11_H)
    extrude(amount=-CUT_EXTRUDE_7_DEPTH, mode=Mode.SUBTRACT)

    # Эскиз12 → Вырез-Вытянуть8 (cut)
    with BuildSketch(Plane(origin=(42.5, 0, 0), x_dir=(0, 0, -1), z_dir=(1, 0, 0))):
        with Locations((-5, 34)):
            Rectangle(SKETCH_12_W, SKETCH_12_H)
        with Locations((-5, 26)):
            Rectangle(SKETCH_12_W, SKETCH_12_H)
        with Locations((-5, 18)):
            Rectangle(SKETCH_12_W, SKETCH_12_H)
        with Locations((-5, 10)):
            Rectangle(SKETCH_12_W, SKETCH_12_H)
    extrude(amount=-CUT_EXTRUDE_8_DEPTH, mode=Mode.SUBTRACT)

    # Эскиз13 → Вырез-Вытянуть9 (cut)
    with BuildSketch(Plane.ZY.offset(42.5)):
        with Locations((-25, 34)):
            Rectangle(SKETCH_13_W, SKETCH_13_H)
        with Locations((-25, 26)):
            Rectangle(SKETCH_13_W, SKETCH_13_H)
        with Locations((-25, 18)):
            Rectangle(SKETCH_13_W, SKETCH_13_H)
        with Locations((-25, 10)):
            Rectangle(SKETCH_13_W, SKETCH_13_H)
    extrude(amount=-CUT_EXTRUDE_9_DEPTH, mode=Mode.SUBTRACT)

    # Эскиз14 → Вырез-Вытянуть10 (cut)
    with BuildSketch(Plane(origin=(0, 8, 0), x_dir=(1, 0, 0), z_dir=(0, 1, 0))):
        with Locations((34, -5)):
            Rectangle(SKETCH_14_W, SKETCH_14_H)
    extrude(amount=-CUT_EXTRUDE_10_DEPTH, mode=Mode.SUBTRACT)


solid = part.part
